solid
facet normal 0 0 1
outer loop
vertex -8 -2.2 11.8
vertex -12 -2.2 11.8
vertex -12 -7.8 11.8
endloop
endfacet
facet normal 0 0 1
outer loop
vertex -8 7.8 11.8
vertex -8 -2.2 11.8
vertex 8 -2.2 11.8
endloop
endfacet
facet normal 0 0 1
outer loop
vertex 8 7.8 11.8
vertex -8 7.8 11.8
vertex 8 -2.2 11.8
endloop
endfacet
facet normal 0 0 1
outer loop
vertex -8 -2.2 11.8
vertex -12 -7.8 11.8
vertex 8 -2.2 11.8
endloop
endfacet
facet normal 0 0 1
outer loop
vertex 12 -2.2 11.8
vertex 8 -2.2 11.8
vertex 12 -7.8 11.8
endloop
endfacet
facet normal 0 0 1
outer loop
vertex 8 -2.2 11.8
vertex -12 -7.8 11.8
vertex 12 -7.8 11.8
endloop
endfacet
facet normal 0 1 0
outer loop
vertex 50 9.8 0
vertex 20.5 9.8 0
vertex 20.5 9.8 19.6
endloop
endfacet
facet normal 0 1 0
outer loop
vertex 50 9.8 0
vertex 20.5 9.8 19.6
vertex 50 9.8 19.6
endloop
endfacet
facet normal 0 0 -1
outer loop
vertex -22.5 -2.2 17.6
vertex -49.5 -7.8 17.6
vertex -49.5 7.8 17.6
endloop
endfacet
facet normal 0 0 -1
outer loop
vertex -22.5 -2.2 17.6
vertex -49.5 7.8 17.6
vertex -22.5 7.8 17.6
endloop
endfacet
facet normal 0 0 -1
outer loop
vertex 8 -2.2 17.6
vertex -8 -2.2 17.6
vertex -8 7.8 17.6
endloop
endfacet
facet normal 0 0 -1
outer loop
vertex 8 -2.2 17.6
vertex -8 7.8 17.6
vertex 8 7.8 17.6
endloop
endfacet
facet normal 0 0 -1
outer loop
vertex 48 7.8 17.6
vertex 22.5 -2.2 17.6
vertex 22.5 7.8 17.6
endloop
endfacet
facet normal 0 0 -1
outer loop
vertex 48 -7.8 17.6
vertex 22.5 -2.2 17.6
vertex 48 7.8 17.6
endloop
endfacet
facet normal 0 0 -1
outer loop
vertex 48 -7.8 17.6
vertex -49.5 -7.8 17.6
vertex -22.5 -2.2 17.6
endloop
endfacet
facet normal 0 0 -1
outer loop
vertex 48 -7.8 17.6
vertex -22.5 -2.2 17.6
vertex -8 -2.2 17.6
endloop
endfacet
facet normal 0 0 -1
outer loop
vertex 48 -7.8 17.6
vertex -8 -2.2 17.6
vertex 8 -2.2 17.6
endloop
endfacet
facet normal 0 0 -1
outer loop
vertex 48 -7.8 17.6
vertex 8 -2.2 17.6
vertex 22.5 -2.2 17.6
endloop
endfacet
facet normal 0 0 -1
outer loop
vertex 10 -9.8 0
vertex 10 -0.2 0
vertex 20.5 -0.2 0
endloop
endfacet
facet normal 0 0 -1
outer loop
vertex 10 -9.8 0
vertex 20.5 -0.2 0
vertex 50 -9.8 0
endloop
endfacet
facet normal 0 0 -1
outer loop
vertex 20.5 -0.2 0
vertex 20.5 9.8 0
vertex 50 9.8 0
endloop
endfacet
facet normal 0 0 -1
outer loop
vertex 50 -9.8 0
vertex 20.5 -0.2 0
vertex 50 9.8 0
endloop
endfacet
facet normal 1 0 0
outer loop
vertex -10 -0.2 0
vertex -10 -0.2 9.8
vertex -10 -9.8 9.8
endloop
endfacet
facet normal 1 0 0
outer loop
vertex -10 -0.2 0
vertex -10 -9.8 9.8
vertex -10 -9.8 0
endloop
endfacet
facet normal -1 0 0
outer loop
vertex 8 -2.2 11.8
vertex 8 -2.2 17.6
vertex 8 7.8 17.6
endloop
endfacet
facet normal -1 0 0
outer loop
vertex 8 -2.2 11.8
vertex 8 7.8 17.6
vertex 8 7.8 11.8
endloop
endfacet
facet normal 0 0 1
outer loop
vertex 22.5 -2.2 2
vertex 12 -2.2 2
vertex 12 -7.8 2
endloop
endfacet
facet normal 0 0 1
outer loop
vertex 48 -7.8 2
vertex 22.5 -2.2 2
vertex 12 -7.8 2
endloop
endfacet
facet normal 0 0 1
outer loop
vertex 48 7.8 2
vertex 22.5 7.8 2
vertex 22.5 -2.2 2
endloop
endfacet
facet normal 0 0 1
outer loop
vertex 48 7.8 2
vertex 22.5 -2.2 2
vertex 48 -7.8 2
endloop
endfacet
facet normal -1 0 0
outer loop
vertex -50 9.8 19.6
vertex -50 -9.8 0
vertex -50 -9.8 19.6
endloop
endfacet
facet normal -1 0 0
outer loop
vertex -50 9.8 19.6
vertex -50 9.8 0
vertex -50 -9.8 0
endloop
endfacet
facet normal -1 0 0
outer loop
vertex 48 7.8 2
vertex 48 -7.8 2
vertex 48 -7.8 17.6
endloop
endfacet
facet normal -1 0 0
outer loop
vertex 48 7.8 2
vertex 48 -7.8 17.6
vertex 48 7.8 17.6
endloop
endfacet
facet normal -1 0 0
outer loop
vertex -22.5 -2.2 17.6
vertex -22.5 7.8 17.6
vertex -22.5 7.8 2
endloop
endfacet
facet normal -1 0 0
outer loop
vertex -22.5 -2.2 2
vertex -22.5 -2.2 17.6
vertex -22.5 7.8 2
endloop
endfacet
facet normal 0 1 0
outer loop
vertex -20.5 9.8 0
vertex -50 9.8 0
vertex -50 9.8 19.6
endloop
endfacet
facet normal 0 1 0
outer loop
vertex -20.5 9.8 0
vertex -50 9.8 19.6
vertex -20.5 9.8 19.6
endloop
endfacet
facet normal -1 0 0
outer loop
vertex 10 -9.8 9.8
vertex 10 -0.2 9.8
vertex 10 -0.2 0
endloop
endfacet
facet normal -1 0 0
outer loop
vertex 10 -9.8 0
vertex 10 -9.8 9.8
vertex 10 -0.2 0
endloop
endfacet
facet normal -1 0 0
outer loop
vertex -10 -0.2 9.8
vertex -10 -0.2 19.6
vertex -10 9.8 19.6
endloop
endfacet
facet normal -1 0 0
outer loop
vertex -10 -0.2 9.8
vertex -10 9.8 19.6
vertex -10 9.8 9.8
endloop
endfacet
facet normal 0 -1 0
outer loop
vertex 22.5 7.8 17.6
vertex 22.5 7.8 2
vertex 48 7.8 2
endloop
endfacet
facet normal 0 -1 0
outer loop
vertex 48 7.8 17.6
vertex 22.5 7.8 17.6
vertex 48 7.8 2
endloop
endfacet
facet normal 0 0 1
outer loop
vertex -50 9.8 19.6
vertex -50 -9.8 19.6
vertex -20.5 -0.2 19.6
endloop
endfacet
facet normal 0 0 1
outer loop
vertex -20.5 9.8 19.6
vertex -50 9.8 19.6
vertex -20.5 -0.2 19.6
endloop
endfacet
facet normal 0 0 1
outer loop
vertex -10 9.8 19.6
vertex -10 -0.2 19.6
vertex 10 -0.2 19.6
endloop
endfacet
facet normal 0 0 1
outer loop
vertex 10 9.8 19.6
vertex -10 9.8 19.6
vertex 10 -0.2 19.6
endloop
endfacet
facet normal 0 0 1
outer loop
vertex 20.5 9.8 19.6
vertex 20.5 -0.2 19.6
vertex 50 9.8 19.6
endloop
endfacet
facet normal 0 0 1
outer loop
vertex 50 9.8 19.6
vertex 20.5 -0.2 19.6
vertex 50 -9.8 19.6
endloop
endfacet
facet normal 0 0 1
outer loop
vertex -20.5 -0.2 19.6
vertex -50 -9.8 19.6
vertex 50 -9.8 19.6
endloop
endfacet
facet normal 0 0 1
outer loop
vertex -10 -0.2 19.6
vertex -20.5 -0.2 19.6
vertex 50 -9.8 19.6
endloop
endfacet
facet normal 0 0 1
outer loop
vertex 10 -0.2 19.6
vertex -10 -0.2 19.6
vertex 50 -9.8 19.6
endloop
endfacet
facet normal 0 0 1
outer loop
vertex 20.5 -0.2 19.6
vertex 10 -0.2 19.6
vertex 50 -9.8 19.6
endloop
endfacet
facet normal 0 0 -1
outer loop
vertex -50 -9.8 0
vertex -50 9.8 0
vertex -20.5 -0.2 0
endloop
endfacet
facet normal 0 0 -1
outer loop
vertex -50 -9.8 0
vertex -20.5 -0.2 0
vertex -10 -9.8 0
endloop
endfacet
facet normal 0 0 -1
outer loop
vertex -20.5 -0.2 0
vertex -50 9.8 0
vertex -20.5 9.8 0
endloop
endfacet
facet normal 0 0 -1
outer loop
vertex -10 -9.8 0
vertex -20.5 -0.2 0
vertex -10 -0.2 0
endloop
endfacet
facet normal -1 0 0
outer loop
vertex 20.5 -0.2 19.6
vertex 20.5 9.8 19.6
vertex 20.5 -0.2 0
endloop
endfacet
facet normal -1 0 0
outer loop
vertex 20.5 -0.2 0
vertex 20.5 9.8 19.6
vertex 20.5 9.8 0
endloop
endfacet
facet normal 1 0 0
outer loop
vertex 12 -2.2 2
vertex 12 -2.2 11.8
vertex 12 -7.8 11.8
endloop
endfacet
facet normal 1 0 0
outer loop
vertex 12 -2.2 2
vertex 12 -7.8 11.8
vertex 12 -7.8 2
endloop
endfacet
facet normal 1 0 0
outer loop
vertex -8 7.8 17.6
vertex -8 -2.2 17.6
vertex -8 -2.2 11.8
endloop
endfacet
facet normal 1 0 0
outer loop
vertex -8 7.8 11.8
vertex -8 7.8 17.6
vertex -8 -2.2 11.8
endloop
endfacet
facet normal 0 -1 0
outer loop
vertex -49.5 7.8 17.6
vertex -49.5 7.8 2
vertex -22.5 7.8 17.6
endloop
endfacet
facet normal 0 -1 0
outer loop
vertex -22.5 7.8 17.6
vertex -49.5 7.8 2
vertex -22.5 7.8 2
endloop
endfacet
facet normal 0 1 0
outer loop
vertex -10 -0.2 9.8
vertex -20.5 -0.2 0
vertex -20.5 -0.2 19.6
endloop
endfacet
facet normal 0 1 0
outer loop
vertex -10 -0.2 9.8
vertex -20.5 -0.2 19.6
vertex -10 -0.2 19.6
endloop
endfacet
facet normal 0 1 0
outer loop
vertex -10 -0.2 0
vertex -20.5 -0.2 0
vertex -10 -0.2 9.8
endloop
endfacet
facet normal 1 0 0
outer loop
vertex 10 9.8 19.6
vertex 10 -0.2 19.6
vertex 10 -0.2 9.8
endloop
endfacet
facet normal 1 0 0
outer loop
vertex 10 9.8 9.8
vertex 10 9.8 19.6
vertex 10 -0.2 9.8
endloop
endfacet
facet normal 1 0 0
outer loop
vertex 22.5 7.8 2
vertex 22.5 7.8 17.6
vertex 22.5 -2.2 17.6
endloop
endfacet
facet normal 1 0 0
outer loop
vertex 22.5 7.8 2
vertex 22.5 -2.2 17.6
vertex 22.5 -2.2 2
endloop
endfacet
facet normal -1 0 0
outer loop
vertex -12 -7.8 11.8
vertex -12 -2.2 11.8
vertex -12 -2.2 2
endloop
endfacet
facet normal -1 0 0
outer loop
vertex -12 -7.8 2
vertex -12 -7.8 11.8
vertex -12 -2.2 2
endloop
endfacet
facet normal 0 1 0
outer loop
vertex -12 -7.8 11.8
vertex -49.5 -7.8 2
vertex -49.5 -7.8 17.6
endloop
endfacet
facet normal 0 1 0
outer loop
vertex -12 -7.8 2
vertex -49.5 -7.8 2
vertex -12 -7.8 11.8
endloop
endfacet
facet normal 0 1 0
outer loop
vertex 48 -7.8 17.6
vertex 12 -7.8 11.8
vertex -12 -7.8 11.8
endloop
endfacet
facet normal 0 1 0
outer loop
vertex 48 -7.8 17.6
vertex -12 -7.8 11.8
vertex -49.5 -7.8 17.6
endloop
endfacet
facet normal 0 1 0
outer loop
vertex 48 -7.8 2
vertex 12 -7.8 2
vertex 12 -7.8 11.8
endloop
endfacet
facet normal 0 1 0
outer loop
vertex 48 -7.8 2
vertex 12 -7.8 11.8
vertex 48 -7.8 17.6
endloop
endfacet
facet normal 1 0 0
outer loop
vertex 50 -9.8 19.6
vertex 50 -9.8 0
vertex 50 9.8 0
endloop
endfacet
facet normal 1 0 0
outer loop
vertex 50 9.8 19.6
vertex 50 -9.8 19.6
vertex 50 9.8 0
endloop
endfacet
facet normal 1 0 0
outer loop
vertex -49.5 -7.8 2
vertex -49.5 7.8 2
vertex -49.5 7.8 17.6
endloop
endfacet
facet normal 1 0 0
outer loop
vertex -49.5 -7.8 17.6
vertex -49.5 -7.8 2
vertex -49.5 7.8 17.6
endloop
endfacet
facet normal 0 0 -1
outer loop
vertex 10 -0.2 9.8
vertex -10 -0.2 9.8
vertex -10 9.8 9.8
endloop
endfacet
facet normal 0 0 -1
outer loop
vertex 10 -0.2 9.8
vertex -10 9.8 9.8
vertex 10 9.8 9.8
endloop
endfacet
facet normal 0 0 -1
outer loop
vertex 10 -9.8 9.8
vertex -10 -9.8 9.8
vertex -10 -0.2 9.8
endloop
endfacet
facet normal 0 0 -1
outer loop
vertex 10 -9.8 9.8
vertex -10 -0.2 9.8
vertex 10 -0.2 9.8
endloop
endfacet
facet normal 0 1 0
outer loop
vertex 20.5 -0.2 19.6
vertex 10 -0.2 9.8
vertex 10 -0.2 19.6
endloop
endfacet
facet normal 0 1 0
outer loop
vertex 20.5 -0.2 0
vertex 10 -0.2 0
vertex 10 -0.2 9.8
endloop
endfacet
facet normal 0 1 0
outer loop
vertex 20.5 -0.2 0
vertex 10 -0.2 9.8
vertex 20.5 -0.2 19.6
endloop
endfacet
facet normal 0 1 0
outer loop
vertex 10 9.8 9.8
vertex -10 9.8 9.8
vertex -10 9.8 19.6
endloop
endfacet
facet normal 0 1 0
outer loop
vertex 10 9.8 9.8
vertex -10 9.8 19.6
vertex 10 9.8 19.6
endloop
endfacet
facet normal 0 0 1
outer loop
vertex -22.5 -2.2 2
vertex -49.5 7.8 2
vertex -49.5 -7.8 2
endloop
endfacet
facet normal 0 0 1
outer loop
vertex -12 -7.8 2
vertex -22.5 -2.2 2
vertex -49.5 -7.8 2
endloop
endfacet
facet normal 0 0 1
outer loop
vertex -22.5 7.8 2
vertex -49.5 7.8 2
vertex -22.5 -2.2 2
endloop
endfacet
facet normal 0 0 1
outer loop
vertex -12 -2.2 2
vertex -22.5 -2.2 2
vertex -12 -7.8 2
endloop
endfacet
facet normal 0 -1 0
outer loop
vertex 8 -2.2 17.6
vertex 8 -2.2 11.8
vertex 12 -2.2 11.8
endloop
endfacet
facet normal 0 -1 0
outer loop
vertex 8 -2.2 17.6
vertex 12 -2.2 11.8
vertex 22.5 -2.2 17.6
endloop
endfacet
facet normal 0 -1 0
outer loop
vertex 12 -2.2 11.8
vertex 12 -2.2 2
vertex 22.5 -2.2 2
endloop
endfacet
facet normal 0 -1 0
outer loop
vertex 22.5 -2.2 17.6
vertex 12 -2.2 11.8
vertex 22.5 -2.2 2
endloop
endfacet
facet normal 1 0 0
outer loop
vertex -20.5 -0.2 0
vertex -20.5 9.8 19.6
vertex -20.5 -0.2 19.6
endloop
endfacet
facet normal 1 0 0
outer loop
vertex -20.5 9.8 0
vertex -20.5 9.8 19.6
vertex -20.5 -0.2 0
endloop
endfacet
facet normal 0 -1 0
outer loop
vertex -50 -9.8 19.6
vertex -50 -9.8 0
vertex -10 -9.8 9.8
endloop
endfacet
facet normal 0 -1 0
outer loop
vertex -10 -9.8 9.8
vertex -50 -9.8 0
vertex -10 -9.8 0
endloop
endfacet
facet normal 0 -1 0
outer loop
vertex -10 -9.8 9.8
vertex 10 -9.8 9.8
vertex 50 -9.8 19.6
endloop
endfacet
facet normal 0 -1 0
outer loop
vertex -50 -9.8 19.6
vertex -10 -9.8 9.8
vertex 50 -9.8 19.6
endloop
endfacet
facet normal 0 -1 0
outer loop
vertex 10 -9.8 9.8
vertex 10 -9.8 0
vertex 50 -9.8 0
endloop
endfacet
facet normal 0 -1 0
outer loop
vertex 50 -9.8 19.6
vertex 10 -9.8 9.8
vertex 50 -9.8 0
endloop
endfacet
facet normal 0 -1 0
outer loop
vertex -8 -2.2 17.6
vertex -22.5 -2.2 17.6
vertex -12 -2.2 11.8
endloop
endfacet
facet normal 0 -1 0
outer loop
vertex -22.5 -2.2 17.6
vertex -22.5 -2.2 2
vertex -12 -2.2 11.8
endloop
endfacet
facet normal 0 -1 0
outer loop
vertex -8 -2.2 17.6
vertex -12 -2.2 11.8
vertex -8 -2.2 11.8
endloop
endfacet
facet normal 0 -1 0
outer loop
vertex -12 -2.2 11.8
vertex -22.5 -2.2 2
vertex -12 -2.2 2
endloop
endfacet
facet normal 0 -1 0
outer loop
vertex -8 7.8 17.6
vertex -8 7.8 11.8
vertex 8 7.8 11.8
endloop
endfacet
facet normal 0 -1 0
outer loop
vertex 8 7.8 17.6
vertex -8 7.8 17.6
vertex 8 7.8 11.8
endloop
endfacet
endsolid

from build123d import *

# Parameters (mm, degrees)
SKETCH_1_W          = 100
SKETCH_1_H          = 19.6
EXTRUDE_1_DEPTH     = 19.6
SKETCH_3_W          = 41
SKETCH_3_H          = 19.6
CUT_EXTRUDE_1_DEPTH = 10
SKETCH_6_W          = 20
SKETCH_6_H          = 19.6
CUT_EXTRUDE_2_DEPTH = 15.5
SKETCH_22_W         = 20
SKETCH_22_H         = 9.8
EXTRUDE_4_DEPTH     = 10
SHELL_3_T           = -2
SKETCH_23_W         = 15.6
SKETCH_23_H         = 15.6
EXTRUDE_5_DEPTH     = 0.5


with BuildPart() as part:
    # 草圖1 → 填料-伸長1 (new body)
    with BuildSketch(Plane.XY):
        Rectangle(SKETCH_1_W, SKETCH_1_H)
    extrude(amount=EXTRUDE_1_DEPTH)

    # 草圖3 → 除料-伸長1 (cut)
    with BuildSketch(Plane(origin=(0, 9.8, 0), x_dir=(1, 0, 0), z_dir=(0, 1, 0))):
        with Locations((0, -9.8)):
            Rectangle(SKETCH_3_W, SKETCH_3_H)
    extrude(amount=-CUT_EXTRUDE_1_DEPTH, mode=Mode.SUBTRACT)

    # 草圖6 → 除料-伸長2 (cut)
    with BuildSketch(Plane(origin=(0, -0.2, 0), x_dir=(1, 0, 0), z_dir=(0, 1, 0))):
        Rectangle(SKETCH_6_W, SKETCH_6_H)
    extrude(amount=-CUT_EXTRUDE_2_DEPTH, mode=Mode.SUBTRACT)

    # 草圖22 → 填料-伸長4 (add)
    with BuildSketch(Plane(origin=(0, -0.2, 0), x_dir=(1, 0, 0), z_dir=(0, 1, 0))):
        with Locations((0, -14.7)):
            Rectangle(SKETCH_22_W, SKETCH_22_H)
    extrude(amount=EXTRUDE_4_DEPTH)

    # 薄殼3
    shell_3_openings = [part.faces().sort_by_distance(p)[0] for p in [
        (-50, 0, 9.8),
    ]]
    offset(amount=SHELL_3_T, openings=shell_3_openings, kind=Kind.INTERSECTION)

    # 草圖23 → 填料-伸長5 (add)
    with BuildSketch(Plane.ZY.offset(50)):
        with Locations((9.8, 0)):
            Rectangle(SKETCH_23_W, SKETCH_23_H)
    extrude(amount=-EXTRUDE_5_DEPTH)


solid = part.part
